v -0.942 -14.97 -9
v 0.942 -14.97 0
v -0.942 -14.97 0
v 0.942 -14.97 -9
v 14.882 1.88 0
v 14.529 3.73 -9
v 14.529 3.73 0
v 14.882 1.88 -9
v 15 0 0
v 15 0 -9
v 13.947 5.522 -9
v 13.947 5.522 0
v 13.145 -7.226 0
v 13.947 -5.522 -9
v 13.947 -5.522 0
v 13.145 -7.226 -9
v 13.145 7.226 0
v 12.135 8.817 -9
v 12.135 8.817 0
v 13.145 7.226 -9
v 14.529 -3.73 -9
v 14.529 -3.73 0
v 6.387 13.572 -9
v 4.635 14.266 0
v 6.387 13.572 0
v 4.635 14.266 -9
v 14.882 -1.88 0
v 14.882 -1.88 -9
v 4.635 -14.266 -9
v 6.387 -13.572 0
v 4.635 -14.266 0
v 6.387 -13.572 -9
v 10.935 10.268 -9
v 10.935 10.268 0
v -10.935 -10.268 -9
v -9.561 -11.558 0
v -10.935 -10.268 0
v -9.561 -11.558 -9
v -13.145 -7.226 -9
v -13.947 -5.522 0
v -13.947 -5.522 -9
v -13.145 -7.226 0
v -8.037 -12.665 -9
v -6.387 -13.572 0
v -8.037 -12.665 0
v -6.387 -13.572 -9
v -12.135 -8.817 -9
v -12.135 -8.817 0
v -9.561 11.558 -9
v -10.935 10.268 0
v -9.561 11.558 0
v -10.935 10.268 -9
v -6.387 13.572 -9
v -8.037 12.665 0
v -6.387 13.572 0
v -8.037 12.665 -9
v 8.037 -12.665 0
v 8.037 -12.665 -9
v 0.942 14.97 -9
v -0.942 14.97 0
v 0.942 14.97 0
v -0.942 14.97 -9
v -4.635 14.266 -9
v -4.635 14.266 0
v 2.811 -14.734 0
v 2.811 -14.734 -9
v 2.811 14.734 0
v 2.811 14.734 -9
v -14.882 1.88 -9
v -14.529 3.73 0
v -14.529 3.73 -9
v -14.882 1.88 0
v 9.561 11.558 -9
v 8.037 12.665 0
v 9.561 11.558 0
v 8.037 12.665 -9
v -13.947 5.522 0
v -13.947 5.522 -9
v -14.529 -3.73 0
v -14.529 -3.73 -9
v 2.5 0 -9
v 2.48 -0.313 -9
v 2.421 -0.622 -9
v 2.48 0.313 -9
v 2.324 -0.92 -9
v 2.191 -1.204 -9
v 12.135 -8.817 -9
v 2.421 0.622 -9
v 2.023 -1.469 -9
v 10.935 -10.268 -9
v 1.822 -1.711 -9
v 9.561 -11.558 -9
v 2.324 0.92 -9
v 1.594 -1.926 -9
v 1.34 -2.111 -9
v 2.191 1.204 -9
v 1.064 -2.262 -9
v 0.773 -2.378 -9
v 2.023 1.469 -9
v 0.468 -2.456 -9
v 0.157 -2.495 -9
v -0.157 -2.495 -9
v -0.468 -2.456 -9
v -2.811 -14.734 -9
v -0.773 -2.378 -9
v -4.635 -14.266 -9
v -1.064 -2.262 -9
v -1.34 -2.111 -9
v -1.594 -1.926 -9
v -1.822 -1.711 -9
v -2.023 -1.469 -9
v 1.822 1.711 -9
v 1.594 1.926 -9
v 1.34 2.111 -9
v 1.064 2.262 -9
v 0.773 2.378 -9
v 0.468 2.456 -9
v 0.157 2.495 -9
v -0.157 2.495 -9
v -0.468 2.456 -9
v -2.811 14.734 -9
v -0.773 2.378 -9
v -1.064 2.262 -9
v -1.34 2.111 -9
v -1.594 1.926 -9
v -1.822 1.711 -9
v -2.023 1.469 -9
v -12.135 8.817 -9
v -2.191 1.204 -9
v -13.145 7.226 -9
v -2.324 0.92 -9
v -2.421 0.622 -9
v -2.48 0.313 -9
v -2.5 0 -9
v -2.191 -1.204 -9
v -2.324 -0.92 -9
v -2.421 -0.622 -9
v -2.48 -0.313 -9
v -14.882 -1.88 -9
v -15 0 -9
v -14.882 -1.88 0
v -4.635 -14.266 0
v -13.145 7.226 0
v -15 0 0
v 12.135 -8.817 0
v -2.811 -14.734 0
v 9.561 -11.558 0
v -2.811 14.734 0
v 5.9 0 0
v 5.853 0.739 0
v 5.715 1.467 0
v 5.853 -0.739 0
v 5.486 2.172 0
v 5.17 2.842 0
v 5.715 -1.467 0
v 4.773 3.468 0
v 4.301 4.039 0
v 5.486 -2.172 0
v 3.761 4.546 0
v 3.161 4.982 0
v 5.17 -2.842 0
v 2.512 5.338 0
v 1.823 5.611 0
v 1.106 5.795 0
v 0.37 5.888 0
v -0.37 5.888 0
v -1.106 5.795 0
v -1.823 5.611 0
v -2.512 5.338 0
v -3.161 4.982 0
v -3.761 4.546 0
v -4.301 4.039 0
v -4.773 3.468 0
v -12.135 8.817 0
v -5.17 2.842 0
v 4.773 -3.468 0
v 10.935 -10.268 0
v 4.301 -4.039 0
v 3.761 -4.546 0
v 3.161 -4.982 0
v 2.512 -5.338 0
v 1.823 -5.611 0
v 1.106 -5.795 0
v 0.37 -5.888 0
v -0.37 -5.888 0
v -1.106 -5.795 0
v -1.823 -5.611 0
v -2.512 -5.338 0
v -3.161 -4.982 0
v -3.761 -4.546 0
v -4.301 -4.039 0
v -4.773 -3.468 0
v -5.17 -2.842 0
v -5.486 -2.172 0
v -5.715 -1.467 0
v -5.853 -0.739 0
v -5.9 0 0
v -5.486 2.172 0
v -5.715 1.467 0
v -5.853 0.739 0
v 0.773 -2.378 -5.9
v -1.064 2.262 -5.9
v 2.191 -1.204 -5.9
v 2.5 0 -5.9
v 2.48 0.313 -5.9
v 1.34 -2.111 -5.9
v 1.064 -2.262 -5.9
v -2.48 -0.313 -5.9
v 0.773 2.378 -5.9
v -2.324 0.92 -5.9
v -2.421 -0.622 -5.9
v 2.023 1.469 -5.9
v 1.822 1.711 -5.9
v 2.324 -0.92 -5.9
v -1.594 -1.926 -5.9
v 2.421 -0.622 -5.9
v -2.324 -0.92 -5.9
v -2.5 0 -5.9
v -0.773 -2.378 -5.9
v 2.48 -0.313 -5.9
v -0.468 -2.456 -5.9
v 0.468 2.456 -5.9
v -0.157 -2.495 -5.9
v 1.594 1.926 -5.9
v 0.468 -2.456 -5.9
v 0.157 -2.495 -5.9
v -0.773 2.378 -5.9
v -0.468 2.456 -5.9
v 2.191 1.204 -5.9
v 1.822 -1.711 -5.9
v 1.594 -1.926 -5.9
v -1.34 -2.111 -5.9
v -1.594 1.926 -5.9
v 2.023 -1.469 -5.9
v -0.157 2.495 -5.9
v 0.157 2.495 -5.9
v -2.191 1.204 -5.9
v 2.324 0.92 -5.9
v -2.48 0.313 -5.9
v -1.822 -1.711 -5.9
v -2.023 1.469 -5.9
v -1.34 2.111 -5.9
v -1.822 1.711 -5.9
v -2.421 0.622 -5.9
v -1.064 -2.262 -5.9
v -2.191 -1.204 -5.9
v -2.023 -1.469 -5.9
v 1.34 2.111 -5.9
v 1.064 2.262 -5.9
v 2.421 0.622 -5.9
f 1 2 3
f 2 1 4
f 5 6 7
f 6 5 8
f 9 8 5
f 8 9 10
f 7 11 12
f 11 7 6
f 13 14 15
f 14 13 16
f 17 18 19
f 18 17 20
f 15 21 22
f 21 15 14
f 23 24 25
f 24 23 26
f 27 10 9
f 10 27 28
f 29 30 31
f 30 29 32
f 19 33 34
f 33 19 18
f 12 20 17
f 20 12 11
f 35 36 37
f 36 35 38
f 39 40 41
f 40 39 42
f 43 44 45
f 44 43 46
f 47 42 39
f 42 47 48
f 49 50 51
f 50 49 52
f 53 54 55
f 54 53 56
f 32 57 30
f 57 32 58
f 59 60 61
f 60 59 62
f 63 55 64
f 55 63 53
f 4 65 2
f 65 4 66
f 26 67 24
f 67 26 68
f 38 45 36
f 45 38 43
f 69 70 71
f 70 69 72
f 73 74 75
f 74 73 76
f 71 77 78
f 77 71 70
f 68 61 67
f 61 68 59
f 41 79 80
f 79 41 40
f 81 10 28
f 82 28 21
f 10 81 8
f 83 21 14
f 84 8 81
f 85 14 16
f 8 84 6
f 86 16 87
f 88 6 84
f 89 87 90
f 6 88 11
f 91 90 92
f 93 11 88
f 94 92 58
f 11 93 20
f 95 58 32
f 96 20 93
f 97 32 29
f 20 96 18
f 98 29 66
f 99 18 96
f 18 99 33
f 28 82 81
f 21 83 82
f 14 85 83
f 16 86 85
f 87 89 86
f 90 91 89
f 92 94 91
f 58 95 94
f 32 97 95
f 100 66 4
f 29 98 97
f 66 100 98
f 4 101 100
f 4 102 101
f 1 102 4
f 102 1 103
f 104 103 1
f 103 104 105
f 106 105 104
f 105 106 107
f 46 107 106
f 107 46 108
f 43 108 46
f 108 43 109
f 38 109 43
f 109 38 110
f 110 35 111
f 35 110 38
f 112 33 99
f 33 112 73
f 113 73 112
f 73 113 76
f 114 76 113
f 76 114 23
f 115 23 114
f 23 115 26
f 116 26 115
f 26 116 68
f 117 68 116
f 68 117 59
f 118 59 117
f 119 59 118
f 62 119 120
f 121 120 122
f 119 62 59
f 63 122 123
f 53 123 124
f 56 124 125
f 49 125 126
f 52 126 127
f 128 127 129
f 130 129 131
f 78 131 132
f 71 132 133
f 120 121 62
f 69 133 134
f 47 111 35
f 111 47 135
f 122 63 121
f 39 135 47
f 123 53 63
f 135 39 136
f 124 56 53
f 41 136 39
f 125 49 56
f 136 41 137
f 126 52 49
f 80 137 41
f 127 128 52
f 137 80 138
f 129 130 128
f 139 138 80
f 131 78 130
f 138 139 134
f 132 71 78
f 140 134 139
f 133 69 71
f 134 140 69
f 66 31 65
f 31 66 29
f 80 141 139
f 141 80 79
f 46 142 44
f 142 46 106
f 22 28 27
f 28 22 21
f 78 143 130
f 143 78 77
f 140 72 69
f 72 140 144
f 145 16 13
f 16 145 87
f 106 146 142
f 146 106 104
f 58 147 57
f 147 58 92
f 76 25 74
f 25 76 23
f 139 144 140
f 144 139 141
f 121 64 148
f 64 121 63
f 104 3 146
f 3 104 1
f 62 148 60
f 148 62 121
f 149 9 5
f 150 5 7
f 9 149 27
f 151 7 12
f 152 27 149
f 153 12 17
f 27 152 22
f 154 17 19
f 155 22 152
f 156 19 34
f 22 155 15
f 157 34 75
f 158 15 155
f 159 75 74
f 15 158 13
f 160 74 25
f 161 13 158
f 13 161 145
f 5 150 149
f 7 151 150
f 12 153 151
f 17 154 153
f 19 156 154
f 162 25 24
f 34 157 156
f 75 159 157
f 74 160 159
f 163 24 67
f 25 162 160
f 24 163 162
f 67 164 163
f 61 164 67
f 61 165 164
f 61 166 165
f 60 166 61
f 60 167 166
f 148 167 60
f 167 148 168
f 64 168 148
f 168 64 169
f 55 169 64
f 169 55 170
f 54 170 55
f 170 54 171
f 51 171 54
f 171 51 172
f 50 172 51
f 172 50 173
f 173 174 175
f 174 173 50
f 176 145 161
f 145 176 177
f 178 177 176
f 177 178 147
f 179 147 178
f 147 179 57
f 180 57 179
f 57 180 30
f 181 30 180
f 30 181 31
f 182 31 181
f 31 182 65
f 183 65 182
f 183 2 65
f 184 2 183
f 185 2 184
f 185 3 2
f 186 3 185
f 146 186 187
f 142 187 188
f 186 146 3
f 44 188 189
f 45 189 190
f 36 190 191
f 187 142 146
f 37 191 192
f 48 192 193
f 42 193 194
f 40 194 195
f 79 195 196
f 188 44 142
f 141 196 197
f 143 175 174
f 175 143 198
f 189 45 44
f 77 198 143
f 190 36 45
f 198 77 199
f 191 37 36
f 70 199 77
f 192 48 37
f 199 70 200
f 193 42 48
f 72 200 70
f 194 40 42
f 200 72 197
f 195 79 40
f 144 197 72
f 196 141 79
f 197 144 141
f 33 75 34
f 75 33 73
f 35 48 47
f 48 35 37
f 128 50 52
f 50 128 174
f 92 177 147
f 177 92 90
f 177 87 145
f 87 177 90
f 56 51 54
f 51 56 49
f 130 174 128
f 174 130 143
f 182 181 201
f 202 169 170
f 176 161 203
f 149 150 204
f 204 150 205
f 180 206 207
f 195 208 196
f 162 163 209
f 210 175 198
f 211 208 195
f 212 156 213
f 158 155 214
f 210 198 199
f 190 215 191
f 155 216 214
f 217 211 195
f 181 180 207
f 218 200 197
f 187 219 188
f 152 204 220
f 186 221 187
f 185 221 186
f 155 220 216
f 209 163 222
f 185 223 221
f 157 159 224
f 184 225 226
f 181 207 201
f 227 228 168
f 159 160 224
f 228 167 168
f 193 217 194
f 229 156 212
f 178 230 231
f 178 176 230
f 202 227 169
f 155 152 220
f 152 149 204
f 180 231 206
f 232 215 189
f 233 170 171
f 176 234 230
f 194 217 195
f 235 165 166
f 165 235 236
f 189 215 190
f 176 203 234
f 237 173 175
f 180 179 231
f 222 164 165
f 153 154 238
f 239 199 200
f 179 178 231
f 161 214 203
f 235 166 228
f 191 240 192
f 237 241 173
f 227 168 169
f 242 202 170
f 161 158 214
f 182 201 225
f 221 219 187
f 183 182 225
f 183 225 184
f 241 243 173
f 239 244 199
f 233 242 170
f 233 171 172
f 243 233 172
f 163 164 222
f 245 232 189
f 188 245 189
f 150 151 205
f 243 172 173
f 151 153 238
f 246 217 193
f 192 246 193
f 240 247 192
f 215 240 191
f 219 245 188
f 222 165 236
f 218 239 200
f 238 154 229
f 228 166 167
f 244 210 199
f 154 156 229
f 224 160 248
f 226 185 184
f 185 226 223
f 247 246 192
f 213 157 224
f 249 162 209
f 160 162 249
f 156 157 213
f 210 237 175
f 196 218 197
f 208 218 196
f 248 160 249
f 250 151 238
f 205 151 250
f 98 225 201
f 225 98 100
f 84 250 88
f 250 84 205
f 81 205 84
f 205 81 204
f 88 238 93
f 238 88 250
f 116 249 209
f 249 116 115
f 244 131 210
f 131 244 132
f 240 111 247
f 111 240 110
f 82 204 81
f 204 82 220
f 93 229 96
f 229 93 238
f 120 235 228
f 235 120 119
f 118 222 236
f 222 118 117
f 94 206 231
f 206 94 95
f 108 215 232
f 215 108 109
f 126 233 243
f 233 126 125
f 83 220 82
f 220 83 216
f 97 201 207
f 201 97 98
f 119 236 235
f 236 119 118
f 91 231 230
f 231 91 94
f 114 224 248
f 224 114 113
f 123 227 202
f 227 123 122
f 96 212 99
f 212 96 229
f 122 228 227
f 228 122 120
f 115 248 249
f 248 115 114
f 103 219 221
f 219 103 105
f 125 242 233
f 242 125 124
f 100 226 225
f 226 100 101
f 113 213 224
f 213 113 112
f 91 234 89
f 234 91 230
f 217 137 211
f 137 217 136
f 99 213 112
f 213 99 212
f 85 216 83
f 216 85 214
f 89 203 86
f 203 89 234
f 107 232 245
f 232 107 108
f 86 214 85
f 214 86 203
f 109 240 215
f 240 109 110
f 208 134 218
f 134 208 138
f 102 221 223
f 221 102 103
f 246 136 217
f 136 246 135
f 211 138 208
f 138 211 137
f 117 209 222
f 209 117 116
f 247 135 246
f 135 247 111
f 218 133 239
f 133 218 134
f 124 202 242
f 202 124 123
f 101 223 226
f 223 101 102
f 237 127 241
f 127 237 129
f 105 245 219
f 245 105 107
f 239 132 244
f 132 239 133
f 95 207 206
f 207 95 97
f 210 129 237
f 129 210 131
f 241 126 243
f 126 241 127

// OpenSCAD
$fn = 50;


difference() {
	union() {
		translate(v = [0, 0, -9.0000000000]) {
			cylinder(h = 9, r = 15.0000000000);
		}
		translate(v = [0, 0, -9.0000000000]) {
			cylinder(h = 9, r = 2.8750000000);
		}
	}
	union() {
		translate(v = [0, 0, 0]) {
			rotate(a = [0, 0, 0]) {
				difference() {
					union() {
						#translate(v = [0, 0, -9.0000000000]) {
							cylinder(h = 9, r = 2.2500000000);
						}
						#translate(v = [0, 0, -5.9000000000]) {
							cylinder(h = 5.9000000000, r1 = 2.5000000000, r2 = 5.9000000000);
						}
						#translate(v = [0, 0, -9.0000000000]) {
							cylinder(h = 9, r = 2.5000000000);
						}
						#translate(v = [0, 0, -9.0000000000]) {
							cylinder(h = 9, r = 2.2500000000);
						}
					}
					union();
				}
			}
		}
	}
}
